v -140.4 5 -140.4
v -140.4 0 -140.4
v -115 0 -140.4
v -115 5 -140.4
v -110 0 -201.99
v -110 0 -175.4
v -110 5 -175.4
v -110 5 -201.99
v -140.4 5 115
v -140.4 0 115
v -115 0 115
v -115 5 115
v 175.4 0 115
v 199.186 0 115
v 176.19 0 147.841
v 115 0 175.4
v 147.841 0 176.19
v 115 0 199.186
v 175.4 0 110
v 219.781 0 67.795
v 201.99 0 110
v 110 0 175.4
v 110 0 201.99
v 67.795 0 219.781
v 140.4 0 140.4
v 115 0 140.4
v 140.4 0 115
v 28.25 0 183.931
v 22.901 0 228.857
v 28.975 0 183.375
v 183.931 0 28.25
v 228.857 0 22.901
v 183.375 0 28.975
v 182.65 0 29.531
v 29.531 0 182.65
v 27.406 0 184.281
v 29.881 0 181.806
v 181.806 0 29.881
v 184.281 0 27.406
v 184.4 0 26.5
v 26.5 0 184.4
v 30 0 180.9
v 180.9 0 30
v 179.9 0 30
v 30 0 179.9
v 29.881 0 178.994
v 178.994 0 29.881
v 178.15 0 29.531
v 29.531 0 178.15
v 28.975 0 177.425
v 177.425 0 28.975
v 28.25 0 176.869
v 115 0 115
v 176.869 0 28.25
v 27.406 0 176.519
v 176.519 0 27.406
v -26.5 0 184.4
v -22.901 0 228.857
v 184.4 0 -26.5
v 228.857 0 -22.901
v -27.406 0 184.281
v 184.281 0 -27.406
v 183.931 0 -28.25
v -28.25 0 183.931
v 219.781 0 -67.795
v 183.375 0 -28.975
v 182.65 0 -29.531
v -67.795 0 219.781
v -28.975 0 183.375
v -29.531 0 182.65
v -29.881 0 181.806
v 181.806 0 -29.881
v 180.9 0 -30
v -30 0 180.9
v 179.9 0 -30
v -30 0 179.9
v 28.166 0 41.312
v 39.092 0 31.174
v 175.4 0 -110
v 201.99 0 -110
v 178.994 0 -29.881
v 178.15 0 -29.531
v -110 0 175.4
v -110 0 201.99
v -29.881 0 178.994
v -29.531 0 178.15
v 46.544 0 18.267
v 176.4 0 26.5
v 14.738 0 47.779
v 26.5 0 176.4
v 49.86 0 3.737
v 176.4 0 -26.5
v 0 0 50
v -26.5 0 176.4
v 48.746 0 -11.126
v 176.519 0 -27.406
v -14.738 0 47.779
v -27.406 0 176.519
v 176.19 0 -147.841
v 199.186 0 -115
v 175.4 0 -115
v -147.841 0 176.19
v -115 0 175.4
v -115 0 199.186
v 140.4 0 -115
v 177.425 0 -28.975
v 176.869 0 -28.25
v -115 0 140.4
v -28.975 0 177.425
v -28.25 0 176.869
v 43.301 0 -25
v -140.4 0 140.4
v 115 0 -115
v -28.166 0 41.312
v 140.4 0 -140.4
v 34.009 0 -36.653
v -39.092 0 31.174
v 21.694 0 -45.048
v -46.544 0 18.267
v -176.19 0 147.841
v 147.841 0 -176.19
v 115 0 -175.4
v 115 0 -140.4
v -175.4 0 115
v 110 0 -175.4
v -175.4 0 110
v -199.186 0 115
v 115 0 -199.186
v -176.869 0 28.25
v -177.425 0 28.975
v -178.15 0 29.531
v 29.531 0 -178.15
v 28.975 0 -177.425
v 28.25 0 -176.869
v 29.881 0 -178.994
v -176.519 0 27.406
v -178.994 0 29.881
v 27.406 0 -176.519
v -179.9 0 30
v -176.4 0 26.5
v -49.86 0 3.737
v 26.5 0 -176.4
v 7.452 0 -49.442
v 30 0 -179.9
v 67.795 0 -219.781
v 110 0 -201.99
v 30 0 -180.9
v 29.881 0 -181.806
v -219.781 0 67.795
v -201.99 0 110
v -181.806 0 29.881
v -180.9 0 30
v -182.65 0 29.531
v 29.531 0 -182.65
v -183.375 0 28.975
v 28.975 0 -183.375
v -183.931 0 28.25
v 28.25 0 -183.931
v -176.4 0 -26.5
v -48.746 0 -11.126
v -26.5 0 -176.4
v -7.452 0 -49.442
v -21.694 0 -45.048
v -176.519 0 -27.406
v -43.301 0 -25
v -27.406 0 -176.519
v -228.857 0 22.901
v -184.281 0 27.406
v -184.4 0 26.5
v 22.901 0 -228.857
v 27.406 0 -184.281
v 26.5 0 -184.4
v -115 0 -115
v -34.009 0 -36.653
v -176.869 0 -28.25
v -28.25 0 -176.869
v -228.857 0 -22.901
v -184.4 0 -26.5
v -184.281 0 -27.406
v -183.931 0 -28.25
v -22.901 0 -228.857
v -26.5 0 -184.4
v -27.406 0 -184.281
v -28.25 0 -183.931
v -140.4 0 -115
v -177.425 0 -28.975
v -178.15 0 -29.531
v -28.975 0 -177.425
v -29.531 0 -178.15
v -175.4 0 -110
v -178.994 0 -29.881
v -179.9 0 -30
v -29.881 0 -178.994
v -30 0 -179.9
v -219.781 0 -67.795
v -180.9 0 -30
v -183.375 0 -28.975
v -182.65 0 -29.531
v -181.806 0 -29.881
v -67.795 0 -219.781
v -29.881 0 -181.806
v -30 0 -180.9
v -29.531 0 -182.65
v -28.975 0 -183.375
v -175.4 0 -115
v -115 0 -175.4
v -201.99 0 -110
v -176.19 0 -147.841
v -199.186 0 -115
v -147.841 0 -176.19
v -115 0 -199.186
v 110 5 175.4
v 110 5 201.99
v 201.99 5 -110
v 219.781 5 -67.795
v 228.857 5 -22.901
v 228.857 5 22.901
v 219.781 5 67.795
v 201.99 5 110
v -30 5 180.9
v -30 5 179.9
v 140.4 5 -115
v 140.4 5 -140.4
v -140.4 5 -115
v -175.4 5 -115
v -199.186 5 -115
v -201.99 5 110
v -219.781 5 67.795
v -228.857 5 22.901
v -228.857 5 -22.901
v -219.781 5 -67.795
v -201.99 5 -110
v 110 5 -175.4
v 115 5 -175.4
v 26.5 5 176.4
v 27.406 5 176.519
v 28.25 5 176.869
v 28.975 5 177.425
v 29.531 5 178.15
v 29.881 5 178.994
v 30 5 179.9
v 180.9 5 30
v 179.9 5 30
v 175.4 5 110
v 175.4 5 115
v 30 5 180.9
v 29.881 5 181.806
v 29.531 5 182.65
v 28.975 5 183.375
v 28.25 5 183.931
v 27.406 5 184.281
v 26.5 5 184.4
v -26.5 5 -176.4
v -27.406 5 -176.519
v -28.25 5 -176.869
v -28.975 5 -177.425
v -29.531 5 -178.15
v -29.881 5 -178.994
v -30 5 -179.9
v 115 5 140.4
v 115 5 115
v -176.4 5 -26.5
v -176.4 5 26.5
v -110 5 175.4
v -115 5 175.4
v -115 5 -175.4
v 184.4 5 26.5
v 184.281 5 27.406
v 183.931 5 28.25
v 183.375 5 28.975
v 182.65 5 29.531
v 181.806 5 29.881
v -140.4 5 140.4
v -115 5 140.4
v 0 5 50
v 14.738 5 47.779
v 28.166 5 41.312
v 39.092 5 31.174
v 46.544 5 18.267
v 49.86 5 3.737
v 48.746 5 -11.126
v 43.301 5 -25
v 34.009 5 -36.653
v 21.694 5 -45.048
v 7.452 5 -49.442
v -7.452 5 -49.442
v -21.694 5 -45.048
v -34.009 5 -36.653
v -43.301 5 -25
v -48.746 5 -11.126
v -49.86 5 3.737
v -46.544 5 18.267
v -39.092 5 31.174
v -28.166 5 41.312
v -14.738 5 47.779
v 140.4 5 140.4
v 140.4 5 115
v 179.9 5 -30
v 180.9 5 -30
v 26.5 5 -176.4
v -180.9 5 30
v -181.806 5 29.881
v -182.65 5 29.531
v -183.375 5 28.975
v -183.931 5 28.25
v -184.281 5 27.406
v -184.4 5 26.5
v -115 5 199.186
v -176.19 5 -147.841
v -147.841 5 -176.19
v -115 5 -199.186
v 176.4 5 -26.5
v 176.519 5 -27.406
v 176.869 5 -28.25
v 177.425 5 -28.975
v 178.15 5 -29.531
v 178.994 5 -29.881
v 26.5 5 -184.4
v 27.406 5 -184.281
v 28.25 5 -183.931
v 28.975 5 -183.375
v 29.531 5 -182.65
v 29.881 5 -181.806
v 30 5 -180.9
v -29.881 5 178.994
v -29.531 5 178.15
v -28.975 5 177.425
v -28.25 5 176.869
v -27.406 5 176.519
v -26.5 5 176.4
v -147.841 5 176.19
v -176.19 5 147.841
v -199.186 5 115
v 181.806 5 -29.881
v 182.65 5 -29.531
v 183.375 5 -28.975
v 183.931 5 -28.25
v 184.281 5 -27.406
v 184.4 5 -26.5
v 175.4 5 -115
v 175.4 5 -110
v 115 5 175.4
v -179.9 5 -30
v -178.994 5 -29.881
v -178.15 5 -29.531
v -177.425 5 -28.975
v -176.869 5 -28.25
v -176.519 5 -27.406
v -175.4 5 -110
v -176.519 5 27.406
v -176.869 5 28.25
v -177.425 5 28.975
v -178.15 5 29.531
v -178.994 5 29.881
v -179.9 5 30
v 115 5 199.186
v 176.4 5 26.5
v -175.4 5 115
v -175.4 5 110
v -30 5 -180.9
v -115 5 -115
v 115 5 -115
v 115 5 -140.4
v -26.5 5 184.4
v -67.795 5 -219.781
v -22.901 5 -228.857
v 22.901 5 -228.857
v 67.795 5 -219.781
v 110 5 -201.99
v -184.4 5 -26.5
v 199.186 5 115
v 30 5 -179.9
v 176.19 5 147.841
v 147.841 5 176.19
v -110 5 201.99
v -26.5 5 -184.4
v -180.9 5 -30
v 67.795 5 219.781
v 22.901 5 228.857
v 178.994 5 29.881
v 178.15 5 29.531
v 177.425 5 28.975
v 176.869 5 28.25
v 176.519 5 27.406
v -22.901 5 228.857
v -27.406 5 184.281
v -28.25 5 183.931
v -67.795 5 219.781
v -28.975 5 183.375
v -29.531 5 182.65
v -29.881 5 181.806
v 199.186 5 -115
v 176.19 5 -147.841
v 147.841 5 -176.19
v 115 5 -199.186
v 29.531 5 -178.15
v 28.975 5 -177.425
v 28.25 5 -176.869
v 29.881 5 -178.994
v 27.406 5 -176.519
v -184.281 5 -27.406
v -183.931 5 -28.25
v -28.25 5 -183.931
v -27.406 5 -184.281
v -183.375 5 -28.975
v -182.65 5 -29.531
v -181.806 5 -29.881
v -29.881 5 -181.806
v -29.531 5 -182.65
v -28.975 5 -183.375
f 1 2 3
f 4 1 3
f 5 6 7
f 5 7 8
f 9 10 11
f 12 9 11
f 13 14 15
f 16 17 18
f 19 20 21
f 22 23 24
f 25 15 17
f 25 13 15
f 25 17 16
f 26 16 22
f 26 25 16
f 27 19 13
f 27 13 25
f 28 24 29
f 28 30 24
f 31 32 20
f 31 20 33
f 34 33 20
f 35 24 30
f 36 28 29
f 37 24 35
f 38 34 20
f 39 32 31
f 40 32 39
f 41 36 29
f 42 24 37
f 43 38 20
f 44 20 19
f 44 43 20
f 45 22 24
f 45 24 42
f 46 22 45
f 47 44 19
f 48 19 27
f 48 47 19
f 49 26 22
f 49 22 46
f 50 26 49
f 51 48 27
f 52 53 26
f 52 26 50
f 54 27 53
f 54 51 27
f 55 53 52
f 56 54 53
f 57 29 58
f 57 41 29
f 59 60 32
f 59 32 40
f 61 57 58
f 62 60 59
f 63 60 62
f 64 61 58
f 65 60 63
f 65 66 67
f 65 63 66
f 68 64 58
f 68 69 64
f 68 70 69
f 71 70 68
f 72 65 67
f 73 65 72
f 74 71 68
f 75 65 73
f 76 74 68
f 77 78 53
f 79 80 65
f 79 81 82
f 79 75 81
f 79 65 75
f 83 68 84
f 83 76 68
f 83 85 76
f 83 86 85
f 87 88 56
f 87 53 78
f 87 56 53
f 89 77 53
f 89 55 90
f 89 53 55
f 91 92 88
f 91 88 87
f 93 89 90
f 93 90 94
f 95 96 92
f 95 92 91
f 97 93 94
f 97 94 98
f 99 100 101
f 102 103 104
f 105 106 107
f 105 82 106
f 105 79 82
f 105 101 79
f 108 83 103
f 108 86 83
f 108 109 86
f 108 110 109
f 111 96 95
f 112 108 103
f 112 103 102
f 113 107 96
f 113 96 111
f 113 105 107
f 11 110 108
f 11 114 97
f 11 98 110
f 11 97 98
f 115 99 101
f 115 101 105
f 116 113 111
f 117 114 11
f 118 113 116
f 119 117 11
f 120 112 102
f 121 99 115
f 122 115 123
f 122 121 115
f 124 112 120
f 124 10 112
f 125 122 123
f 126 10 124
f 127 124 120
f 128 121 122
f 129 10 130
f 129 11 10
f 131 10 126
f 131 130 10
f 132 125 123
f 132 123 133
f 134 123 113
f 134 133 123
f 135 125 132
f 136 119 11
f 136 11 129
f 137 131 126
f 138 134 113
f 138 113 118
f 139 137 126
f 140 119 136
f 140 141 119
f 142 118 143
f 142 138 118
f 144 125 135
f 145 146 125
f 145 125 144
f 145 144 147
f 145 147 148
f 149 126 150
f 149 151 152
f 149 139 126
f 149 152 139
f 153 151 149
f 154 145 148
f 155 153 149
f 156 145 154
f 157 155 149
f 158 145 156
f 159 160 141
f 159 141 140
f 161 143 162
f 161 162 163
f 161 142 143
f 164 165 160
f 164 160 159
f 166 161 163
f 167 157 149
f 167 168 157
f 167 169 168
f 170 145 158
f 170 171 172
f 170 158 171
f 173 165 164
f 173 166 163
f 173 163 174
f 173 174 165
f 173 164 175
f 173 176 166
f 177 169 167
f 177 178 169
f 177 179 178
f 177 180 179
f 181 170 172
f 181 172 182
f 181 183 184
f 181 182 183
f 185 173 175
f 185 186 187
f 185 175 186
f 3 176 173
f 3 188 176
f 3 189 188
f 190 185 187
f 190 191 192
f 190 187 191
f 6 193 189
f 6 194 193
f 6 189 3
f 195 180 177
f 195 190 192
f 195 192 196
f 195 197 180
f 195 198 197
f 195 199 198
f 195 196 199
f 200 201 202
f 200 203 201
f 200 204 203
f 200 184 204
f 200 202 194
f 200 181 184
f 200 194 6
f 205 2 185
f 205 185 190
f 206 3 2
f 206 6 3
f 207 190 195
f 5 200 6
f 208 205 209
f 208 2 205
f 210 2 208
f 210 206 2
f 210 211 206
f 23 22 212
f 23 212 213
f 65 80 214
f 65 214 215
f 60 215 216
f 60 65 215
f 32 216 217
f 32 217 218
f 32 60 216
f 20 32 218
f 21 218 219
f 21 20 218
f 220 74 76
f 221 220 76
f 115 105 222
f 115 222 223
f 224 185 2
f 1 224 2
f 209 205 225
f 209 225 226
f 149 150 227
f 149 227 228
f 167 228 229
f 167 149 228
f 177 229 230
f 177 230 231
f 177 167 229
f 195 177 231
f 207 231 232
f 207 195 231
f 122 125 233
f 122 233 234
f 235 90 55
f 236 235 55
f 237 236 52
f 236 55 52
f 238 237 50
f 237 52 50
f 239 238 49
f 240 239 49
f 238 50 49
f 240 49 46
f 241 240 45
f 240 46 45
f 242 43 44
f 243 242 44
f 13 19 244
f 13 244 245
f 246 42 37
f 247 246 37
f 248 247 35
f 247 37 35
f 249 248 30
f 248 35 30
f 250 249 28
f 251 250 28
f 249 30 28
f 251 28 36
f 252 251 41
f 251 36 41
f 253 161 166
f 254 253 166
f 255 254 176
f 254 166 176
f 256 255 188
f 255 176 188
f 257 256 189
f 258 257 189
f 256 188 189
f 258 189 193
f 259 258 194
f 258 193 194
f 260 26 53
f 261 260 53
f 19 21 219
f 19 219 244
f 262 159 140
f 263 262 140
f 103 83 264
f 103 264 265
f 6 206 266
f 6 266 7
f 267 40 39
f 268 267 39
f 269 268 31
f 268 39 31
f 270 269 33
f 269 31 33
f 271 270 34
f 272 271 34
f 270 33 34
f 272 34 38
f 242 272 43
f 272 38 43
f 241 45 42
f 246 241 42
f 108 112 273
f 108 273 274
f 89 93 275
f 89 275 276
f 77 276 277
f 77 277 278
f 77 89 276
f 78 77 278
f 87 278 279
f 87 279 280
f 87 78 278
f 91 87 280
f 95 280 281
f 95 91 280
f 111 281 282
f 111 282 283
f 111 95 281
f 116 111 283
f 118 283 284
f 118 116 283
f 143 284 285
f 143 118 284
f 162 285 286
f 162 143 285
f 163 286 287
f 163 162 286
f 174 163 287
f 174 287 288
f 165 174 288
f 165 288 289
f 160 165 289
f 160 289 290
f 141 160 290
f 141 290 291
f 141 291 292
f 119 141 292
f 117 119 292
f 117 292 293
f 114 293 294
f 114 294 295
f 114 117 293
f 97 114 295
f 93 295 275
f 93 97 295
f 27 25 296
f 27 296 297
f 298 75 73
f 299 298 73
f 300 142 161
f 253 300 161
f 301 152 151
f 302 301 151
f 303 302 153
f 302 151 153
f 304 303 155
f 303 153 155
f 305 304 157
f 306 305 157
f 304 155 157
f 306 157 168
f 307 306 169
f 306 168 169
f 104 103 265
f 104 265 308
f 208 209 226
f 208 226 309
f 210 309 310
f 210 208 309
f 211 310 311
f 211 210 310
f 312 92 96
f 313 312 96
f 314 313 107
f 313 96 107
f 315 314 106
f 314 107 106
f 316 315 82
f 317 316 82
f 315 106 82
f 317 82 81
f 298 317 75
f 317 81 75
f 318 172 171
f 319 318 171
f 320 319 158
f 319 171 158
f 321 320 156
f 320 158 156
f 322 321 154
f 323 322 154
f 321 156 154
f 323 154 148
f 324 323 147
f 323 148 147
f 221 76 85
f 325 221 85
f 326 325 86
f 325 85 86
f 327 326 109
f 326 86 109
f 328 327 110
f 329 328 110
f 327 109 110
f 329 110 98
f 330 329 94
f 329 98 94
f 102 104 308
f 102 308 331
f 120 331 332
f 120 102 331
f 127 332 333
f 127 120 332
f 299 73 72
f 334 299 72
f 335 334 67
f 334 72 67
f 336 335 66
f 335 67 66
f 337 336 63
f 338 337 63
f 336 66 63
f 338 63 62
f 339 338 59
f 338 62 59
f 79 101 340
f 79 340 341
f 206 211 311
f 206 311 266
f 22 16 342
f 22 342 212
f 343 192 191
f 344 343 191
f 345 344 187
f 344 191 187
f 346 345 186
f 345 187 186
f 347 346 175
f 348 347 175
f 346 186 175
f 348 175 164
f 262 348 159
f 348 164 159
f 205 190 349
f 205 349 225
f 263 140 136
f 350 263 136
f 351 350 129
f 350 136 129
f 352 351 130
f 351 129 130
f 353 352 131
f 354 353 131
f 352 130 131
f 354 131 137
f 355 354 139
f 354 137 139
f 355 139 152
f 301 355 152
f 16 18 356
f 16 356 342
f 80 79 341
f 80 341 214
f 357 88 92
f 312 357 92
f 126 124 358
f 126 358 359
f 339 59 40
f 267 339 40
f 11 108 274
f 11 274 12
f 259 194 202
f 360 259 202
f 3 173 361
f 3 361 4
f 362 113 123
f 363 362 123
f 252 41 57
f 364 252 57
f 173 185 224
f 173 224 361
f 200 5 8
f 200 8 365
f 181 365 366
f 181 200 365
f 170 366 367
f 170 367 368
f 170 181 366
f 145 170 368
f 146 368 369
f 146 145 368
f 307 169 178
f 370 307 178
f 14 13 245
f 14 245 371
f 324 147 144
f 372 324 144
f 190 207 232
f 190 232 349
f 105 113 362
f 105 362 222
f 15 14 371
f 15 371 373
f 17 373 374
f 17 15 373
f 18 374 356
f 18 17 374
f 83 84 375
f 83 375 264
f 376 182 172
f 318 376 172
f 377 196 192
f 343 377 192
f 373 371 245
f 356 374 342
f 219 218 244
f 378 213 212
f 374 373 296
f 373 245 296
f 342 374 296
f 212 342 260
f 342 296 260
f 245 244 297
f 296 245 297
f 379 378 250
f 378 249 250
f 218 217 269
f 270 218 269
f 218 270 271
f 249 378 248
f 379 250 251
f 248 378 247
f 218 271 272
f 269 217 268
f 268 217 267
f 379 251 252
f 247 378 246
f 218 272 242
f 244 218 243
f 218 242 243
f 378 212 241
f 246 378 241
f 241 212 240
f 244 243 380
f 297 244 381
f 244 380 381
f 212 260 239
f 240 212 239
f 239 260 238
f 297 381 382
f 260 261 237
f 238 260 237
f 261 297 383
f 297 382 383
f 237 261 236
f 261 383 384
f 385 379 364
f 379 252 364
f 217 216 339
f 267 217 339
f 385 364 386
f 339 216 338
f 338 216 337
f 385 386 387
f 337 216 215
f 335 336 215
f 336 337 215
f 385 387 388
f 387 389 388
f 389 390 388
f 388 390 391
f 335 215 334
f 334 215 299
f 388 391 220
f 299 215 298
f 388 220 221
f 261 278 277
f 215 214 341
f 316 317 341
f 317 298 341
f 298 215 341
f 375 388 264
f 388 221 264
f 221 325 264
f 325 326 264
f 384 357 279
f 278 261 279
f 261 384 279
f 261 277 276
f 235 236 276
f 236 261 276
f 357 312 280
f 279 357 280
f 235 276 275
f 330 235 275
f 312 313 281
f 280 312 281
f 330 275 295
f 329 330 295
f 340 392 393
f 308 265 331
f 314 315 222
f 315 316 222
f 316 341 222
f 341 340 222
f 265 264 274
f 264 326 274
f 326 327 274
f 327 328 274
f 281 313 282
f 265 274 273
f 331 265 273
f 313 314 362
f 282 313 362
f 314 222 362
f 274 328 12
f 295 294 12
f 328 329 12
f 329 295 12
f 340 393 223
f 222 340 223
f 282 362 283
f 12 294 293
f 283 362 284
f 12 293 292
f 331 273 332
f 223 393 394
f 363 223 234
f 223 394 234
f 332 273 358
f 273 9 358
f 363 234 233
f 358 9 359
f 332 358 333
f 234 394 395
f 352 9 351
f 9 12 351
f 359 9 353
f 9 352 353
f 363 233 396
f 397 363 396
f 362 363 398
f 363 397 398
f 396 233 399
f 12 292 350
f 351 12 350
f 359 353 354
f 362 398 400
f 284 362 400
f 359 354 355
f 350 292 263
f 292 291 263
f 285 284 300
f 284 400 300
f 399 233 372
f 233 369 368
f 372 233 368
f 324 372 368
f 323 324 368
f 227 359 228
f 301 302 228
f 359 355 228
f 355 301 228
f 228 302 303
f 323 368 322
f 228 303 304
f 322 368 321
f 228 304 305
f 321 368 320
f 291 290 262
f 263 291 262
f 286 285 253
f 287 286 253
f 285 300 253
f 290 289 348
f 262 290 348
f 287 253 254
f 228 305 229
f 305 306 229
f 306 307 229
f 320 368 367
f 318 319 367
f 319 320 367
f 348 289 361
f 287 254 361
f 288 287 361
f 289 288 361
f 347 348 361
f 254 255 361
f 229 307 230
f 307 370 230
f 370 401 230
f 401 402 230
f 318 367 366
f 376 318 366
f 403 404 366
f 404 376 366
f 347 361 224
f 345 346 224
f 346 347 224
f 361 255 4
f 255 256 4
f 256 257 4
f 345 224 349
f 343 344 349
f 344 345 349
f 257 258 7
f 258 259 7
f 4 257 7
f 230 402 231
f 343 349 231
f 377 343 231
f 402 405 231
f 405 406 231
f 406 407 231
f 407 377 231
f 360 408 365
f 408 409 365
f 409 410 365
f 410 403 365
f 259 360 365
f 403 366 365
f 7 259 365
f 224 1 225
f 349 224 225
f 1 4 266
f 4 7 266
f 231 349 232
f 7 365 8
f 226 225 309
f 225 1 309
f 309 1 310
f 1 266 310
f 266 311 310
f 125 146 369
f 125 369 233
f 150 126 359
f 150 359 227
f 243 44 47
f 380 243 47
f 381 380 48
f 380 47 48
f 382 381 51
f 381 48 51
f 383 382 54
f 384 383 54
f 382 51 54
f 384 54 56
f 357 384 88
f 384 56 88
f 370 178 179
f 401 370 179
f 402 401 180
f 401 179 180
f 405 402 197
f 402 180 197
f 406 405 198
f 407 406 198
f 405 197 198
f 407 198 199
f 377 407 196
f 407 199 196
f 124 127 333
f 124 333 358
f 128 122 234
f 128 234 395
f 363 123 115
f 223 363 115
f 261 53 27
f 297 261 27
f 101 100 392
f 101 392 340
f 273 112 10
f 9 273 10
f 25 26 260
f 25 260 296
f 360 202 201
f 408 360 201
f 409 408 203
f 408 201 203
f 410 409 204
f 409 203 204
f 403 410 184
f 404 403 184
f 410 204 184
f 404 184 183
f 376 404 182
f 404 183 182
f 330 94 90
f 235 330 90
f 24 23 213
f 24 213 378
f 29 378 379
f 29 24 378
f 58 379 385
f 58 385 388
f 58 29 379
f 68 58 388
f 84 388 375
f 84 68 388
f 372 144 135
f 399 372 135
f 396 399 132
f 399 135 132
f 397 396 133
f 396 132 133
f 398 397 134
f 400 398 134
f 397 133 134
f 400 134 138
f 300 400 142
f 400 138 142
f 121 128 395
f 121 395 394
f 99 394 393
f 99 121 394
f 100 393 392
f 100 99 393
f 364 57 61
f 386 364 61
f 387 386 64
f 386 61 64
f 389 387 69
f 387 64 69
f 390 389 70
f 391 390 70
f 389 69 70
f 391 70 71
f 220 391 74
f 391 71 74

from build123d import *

# Parameters (mm, degrees)
SKETCH1_R           = 50
SKETCH1_W           = 25.4
SKETCH1_H           = 25.4
BOSS_EXTRUDE1_DEPTH = 5


with BuildPart() as part:
    # Sketch1 → Boss-Extrude1 (new body)
    with BuildSketch(Plane(origin=(0, 0, 0), x_dir=(1, 0, 0), z_dir=(0, 1, 0))):
        with BuildLine():
            Line((175.4, 110), (201.990098767, 110))
            ThreePointArc((201.990098767, 110), (230, 0), (201.990098767, -110))
            Line((201.990098767, -110), (175.4, -110))
            Line((175.4, -110), (175.4, -115))
            Line((175.4, -115), (199.18584287, -115))
            ThreePointArc((199.18584287, -115), (162.634559673, -162.634559673), (115, -199.18584287))
            Line((115, -199.18584287), (115, -175.4))
            Line((115, -175.4), (110, -175.4))
            Line((110, -175.4), (110, -201.990098767))
            ThreePointArc((110, -201.990098767), (0, -230), (-110, -201.990098767))
            Line((-110, -201.990098767), (-110, -175.4))
            Line((-110, -175.4), (-115, -175.4))
            Line((-115, -175.4), (-115, -199.18584287))
            ThreePointArc((-115, -199.18584287), (-162.634559673, -162.634559673), (-199.18584287, -115))
            Line((-199.18584287, -115), (-175.4, -115))
            Line((-175.4, -115), (-175.4, -110))
            Line((-175.4, -110), (-201.990098767, -110))
            ThreePointArc((-201.990098767, -110), (-230, 0), (-201.990098767, 110))
            Line((-201.990098767, 110), (-175.4, 110))
            Line((-175.4, 110), (-175.4, 115))
            Line((-175.4, 115), (-199.18584287, 115))
            ThreePointArc((-199.18584287, 115), (-162.634559673, 162.634559673), (-115, 199.18584287))
            Line((-115, 199.18584287), (-115, 175.4))
            Line((-115, 175.4), (-110, 175.4))
            Line((-110, 175.4), (-110, 201.990098767))
            ThreePointArc((-110, 201.990098767), (0, 230), (110, 201.990098767))
            Line((110, 201.990098767), (110, 175.4))
            Line((110, 175.4), (115, 175.4))
            Line((115, 175.4), (115, 199.18584287))
            ThreePointArc((115, 199.18584287), (162.634559673, 162.634559673), (199.18584287, 115))
            Line((199.18584287, 115), (175.4, 115))
            Line((175.4, 115), (175.4, 110))
        make_face()
        with Locations(Location((0, 0, 0), (0, 0, 270))):
            Circle(SKETCH1_R, mode=Mode.SUBTRACT)
        with Locations((127.7, 127.7)):
            Rectangle(SKETCH1_W, SKETCH1_H, mode=Mode.SUBTRACT)
        with Locations((-127.7, 127.7)):
            Rectangle(SKETCH1_W, SKETCH1_H, mode=Mode.SUBTRACT)
        with Locations((127.7, -127.7)):
            Rectangle(SKETCH1_W, SKETCH1_H, mode=Mode.SUBTRACT)
        with Locations((-127.7, -127.7)):
            Rectangle(SKETCH1_W, SKETCH1_H, mode=Mode.SUBTRACT)
        with BuildLine():
            Line((184.4, 26.5), (184.4, -26.5))
            ThreePointArc((184.4, -26.5), (183.374873734, -28.974873734), (180.9, -30))
            Line((180.9, -30), (179.9, -30))
            ThreePointArc((179.9, -30), (177.425126266, -28.974873734), (176.4, -26.5))
            Line((176.4, -26.5), (176.4, 26.5))
            ThreePointArc((176.4, 26.5), (177.425126266, 28.974873734), (179.9, 30))
            Line((179.9, 30), (180.9, 30))
            ThreePointArc((180.9, 30), (183.374873734, 28.974873734), (184.4, 26.5))
        make_face(mode=Mode.SUBTRACT)
        with BuildLine():
            Line((-26.5, 184.4), (26.5, 184.4))
            ThreePointArc((26.5, 184.4), (28.974873734, 183.374873734), (30, 180.9))
            Line((30, 180.9), (30, 179.9))
            ThreePointArc((30, 179.9), (28.974873734, 177.425126266), (26.5, 176.4))
            Line((26.5, 176.4), (-26.5, 176.4))
            ThreePointArc((-26.5, 176.4), (-28.974873734, 177.425126266), (-30, 179.9))
            Line((-30, 179.9), (-30, 180.9))
            ThreePointArc((-30, 180.9), (-28.974873734, 183.374873734), (-26.5, 184.4))
        make_face(mode=Mode.SUBTRACT)
        with BuildLine():
            Line((26.5, -184.4), (-26.5, -184.4))
            ThreePointArc((-26.5, -184.4), (-28.974873734, -183.374873734), (-30, -180.9))
            Line((-30, -180.9), (-30, -179.9))
            ThreePointArc((-30, -179.9), (-28.974873734, -177.425126266), (-26.5, -176.4))
            Line((-26.5, -176.4), (26.5, -176.4))
            ThreePointArc((26.5, -176.4), (28.974873734, -177.425126266), (30, -179.9))
            Line((30, -179.9), (30, -180.9))
            ThreePointArc((30, -180.9), (28.974873734, -183.374873734), (26.5, -184.4))
        make_face(mode=Mode.SUBTRACT)
        with BuildLine():
            Line((-184.4, -26.5), (-184.4, 26.5))
            ThreePointArc((-184.4, 26.5), (-183.374873734, 28.974873734), (-180.9, 30))
            Line((-180.9, 30), (-179.9, 30))
            ThreePointArc((-179.9, 30), (-177.425126266, 28.974873734), (-176.4, 26.5))
            Line((-176.4, 26.5), (-176.4, -26.5))
            ThreePointArc((-176.4, -26.5), (-177.425126266, -28.974873734), (-179.9, -30))
            Line((-179.9, -30), (-180.9, -30))
            ThreePointArc((-180.9, -30), (-183.374873734, -28.974873734), (-184.4, -26.5))
        make_face(mode=Mode.SUBTRACT)
    extrude(amount=BOSS_EXTRUDE1_DEPTH)


solid = part.part
